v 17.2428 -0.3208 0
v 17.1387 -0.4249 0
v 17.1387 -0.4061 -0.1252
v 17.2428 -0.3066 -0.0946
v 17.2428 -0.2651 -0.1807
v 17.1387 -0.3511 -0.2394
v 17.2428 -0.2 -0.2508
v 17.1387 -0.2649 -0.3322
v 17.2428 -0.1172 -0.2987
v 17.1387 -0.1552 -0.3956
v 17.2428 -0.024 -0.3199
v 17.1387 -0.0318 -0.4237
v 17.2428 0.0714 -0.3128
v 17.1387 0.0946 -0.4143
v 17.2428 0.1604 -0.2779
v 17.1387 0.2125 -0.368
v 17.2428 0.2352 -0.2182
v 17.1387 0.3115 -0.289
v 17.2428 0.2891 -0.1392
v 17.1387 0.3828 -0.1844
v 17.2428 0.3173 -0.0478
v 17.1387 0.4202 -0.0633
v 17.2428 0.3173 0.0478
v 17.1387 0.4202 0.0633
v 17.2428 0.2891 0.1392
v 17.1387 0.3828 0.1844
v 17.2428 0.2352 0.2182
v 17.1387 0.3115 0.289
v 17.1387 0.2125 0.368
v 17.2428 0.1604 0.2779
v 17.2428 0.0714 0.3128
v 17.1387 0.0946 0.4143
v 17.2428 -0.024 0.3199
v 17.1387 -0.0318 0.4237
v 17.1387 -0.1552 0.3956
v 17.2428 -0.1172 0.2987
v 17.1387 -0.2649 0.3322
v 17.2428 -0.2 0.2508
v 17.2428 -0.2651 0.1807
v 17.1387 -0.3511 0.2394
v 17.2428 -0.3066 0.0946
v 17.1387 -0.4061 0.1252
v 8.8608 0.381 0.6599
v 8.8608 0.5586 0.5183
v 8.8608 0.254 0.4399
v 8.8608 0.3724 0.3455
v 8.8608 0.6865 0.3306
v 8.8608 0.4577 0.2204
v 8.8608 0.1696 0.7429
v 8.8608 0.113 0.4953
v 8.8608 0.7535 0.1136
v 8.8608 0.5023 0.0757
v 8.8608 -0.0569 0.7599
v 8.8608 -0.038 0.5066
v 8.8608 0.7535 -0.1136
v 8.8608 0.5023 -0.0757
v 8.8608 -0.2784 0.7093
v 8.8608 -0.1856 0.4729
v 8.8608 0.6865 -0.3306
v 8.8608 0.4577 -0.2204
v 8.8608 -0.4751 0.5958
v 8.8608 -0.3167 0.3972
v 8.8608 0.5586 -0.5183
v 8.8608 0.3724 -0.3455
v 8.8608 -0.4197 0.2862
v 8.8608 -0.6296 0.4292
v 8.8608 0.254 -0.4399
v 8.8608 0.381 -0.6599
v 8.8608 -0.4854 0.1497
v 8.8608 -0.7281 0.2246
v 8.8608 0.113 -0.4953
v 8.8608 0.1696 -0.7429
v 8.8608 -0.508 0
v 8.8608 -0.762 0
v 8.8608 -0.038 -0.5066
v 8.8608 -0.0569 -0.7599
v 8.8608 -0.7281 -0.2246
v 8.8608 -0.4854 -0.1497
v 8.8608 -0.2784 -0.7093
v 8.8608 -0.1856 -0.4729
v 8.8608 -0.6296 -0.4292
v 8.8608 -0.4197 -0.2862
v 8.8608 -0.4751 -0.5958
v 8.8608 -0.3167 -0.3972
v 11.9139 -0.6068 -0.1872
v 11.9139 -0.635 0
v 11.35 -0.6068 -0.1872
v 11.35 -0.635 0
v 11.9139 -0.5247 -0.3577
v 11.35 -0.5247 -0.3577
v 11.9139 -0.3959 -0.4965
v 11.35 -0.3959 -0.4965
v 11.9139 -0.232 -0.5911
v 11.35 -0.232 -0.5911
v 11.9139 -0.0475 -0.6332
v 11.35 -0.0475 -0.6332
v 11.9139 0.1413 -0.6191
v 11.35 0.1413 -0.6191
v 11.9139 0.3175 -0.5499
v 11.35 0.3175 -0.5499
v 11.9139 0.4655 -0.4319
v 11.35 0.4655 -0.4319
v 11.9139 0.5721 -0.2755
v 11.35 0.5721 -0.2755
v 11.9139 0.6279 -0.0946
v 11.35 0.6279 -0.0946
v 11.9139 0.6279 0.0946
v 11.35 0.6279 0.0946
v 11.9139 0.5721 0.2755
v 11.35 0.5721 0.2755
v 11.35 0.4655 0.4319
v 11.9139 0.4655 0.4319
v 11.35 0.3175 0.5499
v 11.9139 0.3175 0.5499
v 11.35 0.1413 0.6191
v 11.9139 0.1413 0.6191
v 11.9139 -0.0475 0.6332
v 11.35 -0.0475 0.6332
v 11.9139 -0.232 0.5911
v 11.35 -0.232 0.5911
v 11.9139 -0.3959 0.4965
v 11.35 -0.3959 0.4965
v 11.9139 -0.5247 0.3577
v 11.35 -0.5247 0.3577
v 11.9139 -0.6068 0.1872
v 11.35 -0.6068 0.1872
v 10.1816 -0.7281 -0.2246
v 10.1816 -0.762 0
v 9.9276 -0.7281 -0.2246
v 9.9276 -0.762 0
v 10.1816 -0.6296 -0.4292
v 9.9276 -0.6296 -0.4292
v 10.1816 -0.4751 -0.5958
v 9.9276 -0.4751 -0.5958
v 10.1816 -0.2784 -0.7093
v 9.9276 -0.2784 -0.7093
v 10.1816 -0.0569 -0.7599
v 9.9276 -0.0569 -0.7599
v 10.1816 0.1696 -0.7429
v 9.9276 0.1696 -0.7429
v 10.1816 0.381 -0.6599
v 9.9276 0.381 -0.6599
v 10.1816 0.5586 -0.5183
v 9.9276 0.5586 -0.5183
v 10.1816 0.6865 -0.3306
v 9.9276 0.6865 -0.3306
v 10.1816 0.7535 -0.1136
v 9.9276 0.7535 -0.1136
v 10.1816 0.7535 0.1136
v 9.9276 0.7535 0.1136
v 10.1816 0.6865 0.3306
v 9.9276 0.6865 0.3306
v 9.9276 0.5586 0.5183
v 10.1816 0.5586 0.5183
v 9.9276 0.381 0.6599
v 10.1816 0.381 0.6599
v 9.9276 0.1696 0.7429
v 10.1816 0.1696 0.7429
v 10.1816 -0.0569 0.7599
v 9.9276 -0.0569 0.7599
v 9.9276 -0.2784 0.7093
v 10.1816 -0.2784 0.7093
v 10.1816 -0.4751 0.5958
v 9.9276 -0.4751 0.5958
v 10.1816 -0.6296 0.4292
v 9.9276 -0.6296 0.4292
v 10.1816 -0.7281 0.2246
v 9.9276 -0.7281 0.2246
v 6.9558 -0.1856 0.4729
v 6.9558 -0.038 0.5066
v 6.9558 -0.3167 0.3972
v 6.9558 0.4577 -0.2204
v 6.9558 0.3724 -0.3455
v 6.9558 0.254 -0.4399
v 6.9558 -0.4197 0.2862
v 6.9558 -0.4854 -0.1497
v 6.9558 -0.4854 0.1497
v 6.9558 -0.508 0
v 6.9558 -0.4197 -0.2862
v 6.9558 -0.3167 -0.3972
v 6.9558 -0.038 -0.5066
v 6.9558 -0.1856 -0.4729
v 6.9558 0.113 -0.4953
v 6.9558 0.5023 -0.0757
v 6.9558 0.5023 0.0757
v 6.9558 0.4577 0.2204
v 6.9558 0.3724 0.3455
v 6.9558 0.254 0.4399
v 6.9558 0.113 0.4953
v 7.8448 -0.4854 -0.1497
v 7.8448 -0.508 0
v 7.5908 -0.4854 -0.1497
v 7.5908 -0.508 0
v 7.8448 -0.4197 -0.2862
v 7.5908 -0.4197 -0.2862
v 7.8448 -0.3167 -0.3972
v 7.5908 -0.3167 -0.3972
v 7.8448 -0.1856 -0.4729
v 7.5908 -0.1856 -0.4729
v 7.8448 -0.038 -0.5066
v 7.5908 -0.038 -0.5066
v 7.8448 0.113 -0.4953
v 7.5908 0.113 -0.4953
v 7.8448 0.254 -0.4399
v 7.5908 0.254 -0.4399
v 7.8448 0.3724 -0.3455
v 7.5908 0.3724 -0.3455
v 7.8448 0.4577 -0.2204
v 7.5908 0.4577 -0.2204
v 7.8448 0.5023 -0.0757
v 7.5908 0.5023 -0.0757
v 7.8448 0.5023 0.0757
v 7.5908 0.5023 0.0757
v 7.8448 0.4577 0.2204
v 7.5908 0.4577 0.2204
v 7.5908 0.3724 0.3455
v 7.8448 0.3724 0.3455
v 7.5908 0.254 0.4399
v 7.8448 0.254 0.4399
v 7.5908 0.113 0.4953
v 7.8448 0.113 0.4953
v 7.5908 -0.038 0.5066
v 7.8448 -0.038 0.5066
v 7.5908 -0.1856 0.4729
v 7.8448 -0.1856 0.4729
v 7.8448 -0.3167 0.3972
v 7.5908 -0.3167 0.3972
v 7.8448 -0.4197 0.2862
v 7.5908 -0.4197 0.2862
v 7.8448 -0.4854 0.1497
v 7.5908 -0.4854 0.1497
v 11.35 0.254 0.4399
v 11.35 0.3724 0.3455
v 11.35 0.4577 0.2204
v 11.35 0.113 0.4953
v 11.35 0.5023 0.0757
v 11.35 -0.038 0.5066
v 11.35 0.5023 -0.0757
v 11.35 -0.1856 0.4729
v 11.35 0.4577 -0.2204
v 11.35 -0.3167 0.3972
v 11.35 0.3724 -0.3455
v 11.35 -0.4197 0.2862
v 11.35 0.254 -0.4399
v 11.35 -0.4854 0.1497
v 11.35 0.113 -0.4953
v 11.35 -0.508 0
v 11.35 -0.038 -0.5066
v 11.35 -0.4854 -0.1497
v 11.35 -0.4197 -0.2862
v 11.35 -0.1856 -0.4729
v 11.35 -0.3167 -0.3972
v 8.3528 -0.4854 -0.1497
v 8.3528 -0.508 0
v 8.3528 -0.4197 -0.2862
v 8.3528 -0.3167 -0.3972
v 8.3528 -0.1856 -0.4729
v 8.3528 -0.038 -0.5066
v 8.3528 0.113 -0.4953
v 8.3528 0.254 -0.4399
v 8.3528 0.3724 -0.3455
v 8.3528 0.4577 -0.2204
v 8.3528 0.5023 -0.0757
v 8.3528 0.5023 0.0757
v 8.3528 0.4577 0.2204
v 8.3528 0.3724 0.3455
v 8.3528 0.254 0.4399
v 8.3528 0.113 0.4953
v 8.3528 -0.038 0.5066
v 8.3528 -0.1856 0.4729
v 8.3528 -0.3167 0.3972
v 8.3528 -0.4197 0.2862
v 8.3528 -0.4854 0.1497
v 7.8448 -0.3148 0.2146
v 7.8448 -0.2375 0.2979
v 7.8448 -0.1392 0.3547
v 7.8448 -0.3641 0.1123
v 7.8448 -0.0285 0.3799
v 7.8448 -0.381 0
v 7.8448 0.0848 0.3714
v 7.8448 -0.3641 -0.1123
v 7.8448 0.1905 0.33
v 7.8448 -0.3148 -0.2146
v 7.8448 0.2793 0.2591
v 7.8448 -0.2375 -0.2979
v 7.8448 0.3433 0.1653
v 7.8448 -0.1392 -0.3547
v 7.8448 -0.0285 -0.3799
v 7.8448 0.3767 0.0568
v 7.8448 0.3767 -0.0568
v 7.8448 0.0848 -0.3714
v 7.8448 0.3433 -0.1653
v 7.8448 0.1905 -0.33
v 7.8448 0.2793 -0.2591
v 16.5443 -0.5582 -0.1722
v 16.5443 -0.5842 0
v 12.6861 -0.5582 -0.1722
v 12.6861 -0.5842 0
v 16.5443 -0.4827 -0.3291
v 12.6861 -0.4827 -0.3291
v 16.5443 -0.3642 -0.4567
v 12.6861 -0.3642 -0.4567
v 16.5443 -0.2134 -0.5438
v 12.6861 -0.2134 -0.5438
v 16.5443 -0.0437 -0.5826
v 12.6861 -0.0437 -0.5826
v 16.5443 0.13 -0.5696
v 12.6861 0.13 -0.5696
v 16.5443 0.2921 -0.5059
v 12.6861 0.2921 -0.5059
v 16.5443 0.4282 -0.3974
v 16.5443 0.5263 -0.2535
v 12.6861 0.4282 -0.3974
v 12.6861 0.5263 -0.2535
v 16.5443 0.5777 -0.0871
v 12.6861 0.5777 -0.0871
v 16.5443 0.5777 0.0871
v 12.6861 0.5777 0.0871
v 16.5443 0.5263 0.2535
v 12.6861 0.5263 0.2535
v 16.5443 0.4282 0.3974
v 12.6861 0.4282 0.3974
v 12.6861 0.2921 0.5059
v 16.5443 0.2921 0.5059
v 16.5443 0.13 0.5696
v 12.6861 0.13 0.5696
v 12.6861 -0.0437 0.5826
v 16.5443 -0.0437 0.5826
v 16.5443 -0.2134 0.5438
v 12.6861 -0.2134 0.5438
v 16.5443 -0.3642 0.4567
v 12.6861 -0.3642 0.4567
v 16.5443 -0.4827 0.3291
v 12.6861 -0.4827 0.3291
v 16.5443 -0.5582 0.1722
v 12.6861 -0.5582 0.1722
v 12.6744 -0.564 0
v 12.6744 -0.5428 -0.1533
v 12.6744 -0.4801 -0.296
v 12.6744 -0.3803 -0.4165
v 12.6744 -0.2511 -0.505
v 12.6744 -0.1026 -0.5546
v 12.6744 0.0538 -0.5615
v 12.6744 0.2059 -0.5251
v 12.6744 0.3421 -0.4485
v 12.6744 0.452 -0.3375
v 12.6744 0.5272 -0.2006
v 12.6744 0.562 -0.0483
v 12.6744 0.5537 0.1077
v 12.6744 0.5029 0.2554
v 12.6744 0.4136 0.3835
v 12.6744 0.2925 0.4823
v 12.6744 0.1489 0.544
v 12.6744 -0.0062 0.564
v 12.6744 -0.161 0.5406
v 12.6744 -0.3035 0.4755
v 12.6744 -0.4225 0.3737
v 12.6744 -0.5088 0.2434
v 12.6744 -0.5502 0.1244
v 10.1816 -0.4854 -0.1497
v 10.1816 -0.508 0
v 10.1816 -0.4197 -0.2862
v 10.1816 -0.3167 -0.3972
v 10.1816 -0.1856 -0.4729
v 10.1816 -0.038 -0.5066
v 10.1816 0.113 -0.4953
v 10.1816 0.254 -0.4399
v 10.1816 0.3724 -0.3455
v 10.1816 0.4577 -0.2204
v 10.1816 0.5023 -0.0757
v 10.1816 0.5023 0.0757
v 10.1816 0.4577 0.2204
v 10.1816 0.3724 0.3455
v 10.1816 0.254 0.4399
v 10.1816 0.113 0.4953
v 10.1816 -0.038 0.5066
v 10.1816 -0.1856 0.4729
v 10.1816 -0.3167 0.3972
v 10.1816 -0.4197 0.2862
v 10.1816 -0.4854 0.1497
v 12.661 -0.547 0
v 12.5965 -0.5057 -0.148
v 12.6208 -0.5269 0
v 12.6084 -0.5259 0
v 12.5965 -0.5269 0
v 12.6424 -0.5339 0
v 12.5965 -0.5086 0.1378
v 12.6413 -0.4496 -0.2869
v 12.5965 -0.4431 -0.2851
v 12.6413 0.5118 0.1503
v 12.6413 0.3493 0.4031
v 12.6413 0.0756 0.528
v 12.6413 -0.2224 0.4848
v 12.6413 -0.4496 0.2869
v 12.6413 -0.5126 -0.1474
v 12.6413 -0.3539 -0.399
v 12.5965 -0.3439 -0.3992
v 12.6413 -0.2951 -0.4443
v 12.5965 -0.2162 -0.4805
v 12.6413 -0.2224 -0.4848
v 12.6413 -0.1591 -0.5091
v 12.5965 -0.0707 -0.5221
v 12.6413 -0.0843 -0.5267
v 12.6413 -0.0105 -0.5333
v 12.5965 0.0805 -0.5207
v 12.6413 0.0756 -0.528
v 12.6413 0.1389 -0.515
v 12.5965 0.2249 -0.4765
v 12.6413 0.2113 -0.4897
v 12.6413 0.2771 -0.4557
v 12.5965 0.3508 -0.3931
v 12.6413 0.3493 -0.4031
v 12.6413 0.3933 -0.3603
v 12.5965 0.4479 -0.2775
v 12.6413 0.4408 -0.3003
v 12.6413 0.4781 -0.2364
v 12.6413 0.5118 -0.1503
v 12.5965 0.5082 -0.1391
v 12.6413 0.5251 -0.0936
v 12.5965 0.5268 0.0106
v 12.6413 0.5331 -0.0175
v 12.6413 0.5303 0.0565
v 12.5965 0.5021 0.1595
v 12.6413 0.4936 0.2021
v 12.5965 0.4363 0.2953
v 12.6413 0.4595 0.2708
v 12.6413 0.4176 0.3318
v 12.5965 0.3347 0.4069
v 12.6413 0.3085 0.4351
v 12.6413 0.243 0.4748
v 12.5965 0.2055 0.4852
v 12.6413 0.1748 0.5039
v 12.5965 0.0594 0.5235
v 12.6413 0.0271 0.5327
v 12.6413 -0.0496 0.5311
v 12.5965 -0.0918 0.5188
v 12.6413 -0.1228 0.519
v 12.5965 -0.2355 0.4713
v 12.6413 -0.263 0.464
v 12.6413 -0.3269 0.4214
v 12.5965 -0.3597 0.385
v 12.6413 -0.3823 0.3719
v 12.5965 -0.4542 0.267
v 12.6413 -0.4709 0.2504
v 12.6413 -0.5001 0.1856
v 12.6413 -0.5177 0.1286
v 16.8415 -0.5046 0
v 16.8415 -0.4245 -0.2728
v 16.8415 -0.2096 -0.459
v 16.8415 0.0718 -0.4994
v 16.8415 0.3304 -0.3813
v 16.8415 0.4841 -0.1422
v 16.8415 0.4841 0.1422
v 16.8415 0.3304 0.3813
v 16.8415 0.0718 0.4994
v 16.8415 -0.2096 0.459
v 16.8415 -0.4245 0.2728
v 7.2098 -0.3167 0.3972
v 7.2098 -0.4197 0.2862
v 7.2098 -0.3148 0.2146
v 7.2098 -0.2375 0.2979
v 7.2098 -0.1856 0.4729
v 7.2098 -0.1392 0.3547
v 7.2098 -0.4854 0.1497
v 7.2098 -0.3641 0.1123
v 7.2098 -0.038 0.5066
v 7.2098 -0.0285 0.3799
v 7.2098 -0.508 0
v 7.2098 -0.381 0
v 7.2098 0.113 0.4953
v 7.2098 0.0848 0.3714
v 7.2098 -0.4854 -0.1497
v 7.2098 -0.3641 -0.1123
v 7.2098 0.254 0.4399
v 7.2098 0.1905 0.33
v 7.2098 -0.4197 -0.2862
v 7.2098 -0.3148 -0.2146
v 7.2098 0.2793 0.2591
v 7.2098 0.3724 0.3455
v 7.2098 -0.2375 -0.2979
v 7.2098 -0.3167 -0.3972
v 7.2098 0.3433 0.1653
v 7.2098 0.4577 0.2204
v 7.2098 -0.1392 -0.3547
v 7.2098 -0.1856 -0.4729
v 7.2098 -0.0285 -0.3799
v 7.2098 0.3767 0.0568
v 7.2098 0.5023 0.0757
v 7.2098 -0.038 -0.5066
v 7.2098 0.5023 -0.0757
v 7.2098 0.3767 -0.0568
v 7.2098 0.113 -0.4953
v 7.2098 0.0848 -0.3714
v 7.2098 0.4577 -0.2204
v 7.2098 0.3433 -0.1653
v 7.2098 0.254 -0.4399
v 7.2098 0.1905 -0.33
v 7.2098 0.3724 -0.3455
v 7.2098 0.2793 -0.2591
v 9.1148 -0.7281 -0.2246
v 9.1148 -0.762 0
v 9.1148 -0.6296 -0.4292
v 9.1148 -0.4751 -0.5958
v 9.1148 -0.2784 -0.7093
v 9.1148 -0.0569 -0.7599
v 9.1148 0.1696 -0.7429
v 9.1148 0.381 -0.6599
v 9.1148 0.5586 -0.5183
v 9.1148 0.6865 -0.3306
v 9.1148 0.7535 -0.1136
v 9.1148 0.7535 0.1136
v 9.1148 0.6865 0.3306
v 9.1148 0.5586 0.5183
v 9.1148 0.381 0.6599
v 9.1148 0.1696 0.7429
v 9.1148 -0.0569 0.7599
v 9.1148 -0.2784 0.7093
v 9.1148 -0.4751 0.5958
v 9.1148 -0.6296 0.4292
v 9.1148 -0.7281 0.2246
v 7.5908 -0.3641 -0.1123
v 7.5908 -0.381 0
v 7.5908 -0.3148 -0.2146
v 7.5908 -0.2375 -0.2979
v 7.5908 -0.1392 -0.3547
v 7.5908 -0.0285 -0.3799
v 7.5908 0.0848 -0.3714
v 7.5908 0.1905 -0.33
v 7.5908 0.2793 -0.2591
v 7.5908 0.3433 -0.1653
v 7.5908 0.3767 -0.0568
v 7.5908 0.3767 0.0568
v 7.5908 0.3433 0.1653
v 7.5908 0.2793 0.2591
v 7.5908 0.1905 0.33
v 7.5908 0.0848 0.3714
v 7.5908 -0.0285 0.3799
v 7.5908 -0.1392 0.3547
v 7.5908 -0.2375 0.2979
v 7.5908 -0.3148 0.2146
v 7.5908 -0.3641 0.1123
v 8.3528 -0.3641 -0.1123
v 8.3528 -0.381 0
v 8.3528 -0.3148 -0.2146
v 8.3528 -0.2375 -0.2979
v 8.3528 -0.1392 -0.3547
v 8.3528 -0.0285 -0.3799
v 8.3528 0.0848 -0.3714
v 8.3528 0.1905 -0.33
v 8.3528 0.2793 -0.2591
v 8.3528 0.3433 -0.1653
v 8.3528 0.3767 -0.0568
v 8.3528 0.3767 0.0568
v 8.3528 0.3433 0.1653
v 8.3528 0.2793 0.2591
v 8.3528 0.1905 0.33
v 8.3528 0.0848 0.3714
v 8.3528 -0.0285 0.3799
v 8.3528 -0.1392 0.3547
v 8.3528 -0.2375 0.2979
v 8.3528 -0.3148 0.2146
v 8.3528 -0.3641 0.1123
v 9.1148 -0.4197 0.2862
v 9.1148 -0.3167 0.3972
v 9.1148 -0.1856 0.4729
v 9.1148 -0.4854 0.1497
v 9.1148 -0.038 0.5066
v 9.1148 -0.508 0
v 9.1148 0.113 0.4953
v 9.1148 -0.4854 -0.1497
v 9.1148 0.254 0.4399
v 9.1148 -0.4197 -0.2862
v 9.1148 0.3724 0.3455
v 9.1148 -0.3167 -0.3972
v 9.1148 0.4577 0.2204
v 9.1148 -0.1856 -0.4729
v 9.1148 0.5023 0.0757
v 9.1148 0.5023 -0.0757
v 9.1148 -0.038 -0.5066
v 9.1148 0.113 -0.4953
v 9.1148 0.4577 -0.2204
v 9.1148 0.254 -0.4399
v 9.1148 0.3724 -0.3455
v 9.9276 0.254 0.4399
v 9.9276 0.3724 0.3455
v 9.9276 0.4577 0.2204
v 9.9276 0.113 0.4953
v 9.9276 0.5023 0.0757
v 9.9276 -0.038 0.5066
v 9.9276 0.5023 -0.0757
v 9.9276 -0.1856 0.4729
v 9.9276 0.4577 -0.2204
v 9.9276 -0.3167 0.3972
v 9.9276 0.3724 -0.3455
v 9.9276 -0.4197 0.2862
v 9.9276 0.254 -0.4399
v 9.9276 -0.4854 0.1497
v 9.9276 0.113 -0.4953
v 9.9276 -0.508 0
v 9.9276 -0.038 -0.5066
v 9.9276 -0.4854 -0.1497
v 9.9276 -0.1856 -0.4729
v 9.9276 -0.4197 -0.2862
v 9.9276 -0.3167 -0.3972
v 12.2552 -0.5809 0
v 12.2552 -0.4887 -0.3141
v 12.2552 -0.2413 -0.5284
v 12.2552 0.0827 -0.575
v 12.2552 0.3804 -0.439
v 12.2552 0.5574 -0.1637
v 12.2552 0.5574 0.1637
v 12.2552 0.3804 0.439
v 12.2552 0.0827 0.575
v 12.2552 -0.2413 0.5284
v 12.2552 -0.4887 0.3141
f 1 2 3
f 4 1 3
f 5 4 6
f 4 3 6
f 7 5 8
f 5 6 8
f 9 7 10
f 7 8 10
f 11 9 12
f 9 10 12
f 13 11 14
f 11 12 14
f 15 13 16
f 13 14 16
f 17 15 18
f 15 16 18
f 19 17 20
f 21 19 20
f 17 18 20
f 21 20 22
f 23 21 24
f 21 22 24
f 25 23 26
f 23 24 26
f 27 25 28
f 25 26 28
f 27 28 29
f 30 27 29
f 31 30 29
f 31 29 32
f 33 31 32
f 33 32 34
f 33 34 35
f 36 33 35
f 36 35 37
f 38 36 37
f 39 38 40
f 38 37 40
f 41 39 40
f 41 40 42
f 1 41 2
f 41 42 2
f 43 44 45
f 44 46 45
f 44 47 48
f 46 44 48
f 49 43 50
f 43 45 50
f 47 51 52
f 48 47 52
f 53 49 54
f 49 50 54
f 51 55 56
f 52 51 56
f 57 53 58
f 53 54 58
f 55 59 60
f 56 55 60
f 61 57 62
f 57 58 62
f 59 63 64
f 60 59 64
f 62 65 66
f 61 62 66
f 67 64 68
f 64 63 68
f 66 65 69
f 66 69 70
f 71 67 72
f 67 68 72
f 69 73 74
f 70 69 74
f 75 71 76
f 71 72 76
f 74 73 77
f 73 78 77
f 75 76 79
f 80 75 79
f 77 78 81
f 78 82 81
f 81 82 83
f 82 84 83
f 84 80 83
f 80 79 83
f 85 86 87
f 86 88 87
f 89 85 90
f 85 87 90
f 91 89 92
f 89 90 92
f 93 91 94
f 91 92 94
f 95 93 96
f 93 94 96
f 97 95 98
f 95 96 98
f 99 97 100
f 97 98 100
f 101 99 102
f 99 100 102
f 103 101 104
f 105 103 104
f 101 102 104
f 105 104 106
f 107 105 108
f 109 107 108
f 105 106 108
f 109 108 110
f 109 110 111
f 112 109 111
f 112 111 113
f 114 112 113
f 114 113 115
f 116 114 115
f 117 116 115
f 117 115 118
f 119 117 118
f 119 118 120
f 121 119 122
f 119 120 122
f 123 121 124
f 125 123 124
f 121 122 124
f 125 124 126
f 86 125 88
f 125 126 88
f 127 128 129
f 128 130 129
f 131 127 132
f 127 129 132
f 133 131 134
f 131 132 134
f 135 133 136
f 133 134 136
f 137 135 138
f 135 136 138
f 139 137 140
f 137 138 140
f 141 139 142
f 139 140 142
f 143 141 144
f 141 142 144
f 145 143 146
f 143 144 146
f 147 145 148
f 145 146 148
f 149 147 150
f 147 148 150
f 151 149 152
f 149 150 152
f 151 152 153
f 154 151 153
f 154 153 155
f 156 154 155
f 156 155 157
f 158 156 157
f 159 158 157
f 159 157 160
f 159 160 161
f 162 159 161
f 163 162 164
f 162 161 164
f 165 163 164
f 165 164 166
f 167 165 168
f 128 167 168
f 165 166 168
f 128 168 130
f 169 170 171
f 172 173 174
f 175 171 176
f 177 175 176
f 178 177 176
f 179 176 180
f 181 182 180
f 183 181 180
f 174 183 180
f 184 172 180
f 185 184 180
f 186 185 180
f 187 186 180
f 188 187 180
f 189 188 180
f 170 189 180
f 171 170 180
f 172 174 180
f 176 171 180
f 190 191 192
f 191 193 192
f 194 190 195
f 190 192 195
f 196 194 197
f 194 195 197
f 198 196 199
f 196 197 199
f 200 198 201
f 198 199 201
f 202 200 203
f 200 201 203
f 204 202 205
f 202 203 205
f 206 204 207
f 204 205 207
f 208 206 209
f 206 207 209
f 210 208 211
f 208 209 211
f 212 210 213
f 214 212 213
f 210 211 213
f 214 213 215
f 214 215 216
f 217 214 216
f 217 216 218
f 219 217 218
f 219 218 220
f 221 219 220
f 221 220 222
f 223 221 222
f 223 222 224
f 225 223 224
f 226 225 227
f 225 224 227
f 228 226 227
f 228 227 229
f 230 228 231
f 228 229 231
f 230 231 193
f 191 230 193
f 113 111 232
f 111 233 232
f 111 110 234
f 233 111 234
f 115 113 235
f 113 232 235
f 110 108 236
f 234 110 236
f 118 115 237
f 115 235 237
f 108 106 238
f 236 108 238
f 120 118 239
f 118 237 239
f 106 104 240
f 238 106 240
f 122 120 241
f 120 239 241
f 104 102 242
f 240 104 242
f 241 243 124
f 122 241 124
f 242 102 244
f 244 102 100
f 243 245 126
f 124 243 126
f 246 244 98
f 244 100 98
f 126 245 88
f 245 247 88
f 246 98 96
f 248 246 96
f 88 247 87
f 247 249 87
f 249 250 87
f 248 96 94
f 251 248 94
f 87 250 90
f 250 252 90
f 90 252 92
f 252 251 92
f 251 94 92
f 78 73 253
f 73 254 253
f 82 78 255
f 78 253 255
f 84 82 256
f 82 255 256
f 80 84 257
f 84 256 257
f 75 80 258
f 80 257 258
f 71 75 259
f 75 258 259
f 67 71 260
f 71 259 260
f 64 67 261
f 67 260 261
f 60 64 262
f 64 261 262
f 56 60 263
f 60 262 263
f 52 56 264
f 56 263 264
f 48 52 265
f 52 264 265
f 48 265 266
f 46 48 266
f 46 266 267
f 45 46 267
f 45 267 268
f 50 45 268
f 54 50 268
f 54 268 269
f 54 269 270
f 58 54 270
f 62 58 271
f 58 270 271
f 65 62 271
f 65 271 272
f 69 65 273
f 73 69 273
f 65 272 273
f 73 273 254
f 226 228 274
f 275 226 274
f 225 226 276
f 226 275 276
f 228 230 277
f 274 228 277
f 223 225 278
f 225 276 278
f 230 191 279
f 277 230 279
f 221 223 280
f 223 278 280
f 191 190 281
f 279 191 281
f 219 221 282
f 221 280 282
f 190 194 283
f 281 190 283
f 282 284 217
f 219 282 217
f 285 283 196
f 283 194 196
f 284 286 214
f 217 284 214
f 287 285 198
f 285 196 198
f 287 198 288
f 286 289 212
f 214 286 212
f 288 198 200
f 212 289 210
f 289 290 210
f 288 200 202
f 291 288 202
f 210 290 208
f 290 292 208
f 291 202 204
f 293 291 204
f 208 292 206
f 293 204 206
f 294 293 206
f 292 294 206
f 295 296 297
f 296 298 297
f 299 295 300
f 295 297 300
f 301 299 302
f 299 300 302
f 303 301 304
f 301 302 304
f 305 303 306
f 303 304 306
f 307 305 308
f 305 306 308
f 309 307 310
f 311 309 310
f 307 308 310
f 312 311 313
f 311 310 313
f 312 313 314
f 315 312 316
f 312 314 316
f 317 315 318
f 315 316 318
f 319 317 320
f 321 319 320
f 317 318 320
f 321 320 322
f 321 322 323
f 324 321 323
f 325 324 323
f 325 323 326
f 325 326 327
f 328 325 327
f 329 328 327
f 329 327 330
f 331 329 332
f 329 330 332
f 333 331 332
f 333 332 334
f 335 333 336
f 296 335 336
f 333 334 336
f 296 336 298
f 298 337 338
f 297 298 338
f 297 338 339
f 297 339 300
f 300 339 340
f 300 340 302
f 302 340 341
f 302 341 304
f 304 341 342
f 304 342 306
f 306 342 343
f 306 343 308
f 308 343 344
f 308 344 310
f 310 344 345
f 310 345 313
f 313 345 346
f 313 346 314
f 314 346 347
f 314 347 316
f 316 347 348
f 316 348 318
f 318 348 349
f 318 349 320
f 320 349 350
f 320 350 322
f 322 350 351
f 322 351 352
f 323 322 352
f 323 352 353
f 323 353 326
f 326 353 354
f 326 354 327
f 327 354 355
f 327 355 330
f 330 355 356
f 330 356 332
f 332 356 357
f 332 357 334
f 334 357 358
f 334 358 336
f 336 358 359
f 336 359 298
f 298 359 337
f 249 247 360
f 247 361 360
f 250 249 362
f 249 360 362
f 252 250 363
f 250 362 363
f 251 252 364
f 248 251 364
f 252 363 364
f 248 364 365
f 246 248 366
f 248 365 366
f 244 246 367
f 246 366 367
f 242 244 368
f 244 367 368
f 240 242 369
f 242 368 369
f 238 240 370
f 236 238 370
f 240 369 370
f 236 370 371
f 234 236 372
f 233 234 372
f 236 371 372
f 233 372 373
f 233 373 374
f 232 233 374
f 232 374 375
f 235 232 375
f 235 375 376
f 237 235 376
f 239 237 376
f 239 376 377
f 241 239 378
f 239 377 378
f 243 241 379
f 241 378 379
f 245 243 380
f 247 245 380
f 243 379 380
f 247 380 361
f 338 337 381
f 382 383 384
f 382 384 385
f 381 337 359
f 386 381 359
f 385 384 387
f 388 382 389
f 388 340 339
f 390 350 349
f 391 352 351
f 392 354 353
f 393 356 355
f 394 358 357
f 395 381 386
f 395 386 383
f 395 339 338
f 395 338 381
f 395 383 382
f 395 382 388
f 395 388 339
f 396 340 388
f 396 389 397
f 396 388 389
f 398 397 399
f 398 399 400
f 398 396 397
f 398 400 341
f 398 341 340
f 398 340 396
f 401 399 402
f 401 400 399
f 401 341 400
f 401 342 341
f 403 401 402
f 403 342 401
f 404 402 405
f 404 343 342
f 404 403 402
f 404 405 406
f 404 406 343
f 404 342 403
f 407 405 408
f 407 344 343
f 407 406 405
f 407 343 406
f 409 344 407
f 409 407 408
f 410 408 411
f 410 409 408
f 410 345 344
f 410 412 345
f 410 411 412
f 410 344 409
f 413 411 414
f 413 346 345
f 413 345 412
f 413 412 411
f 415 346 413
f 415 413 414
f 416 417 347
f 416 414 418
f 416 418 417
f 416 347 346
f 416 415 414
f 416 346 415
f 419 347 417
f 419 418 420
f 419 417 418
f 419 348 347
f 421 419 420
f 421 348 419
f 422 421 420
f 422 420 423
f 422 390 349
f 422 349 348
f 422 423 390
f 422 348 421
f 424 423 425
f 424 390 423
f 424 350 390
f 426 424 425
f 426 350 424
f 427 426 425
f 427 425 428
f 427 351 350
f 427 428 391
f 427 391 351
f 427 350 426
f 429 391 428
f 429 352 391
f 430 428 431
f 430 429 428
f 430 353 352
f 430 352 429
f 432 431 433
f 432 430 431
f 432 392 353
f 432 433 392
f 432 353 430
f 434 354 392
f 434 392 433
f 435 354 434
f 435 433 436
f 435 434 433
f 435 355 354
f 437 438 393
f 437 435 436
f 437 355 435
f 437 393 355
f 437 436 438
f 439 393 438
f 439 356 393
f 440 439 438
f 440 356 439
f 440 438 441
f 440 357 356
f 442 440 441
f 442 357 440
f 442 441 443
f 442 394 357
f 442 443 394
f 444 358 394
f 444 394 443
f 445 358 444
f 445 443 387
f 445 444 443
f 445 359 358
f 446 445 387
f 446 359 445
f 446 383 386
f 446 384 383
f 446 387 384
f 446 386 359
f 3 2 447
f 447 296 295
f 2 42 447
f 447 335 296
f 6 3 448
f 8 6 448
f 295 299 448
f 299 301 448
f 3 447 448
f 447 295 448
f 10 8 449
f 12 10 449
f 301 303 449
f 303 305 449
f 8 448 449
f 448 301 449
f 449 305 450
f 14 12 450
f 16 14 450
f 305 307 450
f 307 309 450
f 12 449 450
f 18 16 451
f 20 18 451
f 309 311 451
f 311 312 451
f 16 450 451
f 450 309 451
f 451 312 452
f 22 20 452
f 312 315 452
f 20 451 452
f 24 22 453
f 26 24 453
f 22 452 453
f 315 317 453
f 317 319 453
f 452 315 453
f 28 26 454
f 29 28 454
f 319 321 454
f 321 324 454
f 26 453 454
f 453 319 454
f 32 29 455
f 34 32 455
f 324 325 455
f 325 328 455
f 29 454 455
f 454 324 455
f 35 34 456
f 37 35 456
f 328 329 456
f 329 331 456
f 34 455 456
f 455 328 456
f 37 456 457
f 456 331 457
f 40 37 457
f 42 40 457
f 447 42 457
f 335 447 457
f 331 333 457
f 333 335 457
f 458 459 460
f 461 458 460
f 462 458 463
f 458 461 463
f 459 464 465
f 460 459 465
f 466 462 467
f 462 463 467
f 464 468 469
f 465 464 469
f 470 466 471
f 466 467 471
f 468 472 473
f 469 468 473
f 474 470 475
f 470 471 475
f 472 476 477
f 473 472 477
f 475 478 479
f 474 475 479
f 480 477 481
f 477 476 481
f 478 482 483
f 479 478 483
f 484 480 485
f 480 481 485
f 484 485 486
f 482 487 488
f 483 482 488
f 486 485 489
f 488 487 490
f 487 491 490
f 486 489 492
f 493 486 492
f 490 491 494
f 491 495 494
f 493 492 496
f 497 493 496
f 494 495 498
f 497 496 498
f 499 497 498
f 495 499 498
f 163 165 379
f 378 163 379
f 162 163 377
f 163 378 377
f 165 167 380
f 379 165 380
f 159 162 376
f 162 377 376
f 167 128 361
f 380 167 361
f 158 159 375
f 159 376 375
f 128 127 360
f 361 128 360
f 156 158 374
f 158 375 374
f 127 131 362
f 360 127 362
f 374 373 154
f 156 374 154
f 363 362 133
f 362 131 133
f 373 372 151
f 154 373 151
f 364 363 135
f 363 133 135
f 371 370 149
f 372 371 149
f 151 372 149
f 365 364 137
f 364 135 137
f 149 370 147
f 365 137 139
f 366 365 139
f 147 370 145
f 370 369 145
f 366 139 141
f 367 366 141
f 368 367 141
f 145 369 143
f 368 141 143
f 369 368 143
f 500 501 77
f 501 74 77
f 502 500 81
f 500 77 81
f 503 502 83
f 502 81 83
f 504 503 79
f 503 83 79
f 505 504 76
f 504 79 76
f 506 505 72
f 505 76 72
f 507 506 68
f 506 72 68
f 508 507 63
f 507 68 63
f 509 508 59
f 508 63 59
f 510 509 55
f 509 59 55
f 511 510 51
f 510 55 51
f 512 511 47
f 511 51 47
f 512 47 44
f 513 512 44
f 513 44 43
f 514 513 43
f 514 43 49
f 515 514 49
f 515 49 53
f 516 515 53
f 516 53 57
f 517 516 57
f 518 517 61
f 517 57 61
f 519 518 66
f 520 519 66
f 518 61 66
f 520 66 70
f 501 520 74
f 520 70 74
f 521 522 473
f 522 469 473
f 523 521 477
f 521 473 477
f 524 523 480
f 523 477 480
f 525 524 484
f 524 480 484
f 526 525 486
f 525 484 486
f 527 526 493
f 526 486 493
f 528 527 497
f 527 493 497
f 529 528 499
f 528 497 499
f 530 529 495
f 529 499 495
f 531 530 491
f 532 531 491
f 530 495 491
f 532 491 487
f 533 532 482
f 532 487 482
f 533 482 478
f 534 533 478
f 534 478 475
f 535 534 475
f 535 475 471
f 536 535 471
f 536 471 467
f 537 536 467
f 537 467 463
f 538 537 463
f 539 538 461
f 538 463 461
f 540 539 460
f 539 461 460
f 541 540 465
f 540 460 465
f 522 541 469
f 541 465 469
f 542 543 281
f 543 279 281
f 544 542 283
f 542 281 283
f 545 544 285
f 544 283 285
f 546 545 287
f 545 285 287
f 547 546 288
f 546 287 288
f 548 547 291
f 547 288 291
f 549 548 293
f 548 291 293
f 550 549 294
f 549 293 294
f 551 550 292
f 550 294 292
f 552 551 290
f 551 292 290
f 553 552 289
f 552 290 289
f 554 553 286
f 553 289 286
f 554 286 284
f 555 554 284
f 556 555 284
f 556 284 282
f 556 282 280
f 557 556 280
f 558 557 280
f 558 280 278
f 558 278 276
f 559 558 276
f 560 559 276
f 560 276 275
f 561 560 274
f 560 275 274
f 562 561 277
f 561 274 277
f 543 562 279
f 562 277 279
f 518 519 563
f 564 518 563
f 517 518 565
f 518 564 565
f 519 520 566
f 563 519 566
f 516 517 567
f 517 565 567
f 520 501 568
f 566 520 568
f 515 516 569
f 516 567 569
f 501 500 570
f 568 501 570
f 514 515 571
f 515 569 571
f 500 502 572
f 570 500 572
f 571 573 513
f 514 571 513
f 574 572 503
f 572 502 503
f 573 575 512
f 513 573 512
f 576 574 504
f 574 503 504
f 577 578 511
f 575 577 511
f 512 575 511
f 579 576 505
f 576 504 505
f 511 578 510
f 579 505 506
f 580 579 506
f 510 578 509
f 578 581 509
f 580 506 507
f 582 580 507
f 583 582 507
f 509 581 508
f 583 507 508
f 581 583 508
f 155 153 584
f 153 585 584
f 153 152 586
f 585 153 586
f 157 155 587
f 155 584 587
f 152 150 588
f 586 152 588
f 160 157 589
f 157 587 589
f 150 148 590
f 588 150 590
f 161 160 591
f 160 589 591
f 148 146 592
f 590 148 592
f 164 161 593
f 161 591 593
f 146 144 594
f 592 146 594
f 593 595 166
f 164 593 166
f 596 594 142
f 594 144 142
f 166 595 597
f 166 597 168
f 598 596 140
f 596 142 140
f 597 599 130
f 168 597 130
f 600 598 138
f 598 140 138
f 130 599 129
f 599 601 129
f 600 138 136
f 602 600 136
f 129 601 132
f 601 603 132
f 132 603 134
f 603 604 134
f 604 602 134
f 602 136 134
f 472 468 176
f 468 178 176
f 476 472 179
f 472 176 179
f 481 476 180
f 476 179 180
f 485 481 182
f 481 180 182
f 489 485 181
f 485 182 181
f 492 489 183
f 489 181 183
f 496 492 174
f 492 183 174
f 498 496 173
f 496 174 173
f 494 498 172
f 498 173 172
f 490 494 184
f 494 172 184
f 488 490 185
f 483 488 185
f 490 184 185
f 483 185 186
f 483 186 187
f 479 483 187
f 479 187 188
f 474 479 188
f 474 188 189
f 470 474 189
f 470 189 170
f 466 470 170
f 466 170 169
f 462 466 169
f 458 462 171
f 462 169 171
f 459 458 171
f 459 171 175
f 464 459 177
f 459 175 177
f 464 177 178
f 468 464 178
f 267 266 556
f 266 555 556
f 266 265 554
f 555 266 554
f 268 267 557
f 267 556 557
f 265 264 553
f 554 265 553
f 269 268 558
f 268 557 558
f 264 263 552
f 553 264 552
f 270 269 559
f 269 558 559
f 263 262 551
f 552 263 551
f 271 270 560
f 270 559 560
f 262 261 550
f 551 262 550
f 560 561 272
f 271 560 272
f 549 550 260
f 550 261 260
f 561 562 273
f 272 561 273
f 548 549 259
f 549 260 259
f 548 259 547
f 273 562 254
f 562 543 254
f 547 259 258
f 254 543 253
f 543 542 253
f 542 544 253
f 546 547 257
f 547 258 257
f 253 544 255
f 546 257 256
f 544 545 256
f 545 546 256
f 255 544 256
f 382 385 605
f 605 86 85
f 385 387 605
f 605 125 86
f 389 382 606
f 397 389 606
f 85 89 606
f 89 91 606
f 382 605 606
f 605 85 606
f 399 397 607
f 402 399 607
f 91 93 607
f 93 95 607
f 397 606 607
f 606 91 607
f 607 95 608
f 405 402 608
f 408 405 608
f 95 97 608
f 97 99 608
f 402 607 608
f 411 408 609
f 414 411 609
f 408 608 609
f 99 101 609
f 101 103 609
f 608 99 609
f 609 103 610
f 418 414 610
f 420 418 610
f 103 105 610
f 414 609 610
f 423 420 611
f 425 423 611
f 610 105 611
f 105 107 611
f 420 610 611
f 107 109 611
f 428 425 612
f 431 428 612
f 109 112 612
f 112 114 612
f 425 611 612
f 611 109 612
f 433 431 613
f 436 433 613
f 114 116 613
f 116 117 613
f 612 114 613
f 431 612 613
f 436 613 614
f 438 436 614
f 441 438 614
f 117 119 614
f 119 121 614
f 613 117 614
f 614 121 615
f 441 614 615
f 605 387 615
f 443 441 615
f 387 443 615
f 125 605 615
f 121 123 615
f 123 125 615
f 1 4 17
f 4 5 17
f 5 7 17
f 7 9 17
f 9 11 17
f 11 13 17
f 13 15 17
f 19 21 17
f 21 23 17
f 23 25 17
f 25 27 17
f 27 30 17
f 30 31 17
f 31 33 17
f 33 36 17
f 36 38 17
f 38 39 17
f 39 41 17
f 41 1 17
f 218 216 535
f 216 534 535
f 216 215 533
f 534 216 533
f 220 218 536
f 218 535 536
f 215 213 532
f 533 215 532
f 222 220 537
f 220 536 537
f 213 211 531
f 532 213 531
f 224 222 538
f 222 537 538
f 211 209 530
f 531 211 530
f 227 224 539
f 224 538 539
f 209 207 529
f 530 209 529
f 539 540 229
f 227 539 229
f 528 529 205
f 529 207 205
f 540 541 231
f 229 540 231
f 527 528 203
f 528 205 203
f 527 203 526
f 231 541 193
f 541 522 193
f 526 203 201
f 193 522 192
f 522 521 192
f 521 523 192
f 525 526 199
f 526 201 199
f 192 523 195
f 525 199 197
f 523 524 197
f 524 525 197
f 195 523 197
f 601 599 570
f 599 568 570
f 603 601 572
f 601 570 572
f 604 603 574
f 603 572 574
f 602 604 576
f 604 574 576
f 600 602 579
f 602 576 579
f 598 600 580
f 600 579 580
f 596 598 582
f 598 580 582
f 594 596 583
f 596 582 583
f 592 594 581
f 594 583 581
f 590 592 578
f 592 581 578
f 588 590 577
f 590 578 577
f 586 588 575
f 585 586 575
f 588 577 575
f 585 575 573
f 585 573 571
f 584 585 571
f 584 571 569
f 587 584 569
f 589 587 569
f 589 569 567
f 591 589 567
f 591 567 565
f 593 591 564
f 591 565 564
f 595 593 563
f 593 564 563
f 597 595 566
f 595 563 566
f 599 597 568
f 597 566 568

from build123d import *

# Parameters (mm, degrees)
FILLET1_R      = 0.0762
CHAMFER1_SIZE  = 0.0762
CHAMFER1_SIZE2 = 0.107763073


with BuildPart() as part:
    # Sketch1 → Revolve1 (revolve)
    with BuildSketch(Plane.XY, mode=Mode.PRIVATE) as revolve1_sk:
        Polygon((6.955835037, 0.508), (6.955835037, 0), (17.242835037, 0), (17.242835037, 0.397037489), (16.544335037, 0.5842), (12.686075037, 0.5842), (12.648252987, 0.518690288), (11.913915037, 0.635), (11.350035037, 0.635), (11.350035037, 0.508), (10.181635037, 0.508), (10.181635037, 0.762), (9.927635037, 0.762), (9.927635037, 0.508), (9.114835037, 0.508), (9.114835037, 0.762), (8.860835037, 0.762), (8.860835037, 0.508), (8.352835037, 0.508), (8.352835037, 0.381), (7.844835037, 0.381), (7.844835037, 0.508), (7.590835037, 0.508), (7.590835037, 0.381), (7.209835037, 0.381), (7.209835037, 0.508), align=None)
    revolve(revolve1_sk.sketch.rotate(Axis((-986.284560053, 0, 0), (1, 0, 0)), 180), axis=Axis((-986.284560053, 0, 0), (1, 0, 0)))

    # Fillet1
    fillet1_edges = [part.edges().sort_by_distance(p)[0] for p in [
        (12.648252987, 0.518690288, 0),
    ]]
    fillet(fillet1_edges, radius=FILLET1_R)

    # Chamfer1
    chamfer1_edges = [part.edges().sort_by_distance(p)[0] for p in [
        (17.242835037, 0.397037489, 0),
    ]]
    chamfer1_side = [part.faces().sort_by_distance(p)[0] for p in [
        (17.242835037, 0, 0),
    ]]
    chamfer(chamfer1_edges, length=CHAMFER1_SIZE, length2=CHAMFER1_SIZE2, reference=chamfer1_side[0])


solid = part.part
